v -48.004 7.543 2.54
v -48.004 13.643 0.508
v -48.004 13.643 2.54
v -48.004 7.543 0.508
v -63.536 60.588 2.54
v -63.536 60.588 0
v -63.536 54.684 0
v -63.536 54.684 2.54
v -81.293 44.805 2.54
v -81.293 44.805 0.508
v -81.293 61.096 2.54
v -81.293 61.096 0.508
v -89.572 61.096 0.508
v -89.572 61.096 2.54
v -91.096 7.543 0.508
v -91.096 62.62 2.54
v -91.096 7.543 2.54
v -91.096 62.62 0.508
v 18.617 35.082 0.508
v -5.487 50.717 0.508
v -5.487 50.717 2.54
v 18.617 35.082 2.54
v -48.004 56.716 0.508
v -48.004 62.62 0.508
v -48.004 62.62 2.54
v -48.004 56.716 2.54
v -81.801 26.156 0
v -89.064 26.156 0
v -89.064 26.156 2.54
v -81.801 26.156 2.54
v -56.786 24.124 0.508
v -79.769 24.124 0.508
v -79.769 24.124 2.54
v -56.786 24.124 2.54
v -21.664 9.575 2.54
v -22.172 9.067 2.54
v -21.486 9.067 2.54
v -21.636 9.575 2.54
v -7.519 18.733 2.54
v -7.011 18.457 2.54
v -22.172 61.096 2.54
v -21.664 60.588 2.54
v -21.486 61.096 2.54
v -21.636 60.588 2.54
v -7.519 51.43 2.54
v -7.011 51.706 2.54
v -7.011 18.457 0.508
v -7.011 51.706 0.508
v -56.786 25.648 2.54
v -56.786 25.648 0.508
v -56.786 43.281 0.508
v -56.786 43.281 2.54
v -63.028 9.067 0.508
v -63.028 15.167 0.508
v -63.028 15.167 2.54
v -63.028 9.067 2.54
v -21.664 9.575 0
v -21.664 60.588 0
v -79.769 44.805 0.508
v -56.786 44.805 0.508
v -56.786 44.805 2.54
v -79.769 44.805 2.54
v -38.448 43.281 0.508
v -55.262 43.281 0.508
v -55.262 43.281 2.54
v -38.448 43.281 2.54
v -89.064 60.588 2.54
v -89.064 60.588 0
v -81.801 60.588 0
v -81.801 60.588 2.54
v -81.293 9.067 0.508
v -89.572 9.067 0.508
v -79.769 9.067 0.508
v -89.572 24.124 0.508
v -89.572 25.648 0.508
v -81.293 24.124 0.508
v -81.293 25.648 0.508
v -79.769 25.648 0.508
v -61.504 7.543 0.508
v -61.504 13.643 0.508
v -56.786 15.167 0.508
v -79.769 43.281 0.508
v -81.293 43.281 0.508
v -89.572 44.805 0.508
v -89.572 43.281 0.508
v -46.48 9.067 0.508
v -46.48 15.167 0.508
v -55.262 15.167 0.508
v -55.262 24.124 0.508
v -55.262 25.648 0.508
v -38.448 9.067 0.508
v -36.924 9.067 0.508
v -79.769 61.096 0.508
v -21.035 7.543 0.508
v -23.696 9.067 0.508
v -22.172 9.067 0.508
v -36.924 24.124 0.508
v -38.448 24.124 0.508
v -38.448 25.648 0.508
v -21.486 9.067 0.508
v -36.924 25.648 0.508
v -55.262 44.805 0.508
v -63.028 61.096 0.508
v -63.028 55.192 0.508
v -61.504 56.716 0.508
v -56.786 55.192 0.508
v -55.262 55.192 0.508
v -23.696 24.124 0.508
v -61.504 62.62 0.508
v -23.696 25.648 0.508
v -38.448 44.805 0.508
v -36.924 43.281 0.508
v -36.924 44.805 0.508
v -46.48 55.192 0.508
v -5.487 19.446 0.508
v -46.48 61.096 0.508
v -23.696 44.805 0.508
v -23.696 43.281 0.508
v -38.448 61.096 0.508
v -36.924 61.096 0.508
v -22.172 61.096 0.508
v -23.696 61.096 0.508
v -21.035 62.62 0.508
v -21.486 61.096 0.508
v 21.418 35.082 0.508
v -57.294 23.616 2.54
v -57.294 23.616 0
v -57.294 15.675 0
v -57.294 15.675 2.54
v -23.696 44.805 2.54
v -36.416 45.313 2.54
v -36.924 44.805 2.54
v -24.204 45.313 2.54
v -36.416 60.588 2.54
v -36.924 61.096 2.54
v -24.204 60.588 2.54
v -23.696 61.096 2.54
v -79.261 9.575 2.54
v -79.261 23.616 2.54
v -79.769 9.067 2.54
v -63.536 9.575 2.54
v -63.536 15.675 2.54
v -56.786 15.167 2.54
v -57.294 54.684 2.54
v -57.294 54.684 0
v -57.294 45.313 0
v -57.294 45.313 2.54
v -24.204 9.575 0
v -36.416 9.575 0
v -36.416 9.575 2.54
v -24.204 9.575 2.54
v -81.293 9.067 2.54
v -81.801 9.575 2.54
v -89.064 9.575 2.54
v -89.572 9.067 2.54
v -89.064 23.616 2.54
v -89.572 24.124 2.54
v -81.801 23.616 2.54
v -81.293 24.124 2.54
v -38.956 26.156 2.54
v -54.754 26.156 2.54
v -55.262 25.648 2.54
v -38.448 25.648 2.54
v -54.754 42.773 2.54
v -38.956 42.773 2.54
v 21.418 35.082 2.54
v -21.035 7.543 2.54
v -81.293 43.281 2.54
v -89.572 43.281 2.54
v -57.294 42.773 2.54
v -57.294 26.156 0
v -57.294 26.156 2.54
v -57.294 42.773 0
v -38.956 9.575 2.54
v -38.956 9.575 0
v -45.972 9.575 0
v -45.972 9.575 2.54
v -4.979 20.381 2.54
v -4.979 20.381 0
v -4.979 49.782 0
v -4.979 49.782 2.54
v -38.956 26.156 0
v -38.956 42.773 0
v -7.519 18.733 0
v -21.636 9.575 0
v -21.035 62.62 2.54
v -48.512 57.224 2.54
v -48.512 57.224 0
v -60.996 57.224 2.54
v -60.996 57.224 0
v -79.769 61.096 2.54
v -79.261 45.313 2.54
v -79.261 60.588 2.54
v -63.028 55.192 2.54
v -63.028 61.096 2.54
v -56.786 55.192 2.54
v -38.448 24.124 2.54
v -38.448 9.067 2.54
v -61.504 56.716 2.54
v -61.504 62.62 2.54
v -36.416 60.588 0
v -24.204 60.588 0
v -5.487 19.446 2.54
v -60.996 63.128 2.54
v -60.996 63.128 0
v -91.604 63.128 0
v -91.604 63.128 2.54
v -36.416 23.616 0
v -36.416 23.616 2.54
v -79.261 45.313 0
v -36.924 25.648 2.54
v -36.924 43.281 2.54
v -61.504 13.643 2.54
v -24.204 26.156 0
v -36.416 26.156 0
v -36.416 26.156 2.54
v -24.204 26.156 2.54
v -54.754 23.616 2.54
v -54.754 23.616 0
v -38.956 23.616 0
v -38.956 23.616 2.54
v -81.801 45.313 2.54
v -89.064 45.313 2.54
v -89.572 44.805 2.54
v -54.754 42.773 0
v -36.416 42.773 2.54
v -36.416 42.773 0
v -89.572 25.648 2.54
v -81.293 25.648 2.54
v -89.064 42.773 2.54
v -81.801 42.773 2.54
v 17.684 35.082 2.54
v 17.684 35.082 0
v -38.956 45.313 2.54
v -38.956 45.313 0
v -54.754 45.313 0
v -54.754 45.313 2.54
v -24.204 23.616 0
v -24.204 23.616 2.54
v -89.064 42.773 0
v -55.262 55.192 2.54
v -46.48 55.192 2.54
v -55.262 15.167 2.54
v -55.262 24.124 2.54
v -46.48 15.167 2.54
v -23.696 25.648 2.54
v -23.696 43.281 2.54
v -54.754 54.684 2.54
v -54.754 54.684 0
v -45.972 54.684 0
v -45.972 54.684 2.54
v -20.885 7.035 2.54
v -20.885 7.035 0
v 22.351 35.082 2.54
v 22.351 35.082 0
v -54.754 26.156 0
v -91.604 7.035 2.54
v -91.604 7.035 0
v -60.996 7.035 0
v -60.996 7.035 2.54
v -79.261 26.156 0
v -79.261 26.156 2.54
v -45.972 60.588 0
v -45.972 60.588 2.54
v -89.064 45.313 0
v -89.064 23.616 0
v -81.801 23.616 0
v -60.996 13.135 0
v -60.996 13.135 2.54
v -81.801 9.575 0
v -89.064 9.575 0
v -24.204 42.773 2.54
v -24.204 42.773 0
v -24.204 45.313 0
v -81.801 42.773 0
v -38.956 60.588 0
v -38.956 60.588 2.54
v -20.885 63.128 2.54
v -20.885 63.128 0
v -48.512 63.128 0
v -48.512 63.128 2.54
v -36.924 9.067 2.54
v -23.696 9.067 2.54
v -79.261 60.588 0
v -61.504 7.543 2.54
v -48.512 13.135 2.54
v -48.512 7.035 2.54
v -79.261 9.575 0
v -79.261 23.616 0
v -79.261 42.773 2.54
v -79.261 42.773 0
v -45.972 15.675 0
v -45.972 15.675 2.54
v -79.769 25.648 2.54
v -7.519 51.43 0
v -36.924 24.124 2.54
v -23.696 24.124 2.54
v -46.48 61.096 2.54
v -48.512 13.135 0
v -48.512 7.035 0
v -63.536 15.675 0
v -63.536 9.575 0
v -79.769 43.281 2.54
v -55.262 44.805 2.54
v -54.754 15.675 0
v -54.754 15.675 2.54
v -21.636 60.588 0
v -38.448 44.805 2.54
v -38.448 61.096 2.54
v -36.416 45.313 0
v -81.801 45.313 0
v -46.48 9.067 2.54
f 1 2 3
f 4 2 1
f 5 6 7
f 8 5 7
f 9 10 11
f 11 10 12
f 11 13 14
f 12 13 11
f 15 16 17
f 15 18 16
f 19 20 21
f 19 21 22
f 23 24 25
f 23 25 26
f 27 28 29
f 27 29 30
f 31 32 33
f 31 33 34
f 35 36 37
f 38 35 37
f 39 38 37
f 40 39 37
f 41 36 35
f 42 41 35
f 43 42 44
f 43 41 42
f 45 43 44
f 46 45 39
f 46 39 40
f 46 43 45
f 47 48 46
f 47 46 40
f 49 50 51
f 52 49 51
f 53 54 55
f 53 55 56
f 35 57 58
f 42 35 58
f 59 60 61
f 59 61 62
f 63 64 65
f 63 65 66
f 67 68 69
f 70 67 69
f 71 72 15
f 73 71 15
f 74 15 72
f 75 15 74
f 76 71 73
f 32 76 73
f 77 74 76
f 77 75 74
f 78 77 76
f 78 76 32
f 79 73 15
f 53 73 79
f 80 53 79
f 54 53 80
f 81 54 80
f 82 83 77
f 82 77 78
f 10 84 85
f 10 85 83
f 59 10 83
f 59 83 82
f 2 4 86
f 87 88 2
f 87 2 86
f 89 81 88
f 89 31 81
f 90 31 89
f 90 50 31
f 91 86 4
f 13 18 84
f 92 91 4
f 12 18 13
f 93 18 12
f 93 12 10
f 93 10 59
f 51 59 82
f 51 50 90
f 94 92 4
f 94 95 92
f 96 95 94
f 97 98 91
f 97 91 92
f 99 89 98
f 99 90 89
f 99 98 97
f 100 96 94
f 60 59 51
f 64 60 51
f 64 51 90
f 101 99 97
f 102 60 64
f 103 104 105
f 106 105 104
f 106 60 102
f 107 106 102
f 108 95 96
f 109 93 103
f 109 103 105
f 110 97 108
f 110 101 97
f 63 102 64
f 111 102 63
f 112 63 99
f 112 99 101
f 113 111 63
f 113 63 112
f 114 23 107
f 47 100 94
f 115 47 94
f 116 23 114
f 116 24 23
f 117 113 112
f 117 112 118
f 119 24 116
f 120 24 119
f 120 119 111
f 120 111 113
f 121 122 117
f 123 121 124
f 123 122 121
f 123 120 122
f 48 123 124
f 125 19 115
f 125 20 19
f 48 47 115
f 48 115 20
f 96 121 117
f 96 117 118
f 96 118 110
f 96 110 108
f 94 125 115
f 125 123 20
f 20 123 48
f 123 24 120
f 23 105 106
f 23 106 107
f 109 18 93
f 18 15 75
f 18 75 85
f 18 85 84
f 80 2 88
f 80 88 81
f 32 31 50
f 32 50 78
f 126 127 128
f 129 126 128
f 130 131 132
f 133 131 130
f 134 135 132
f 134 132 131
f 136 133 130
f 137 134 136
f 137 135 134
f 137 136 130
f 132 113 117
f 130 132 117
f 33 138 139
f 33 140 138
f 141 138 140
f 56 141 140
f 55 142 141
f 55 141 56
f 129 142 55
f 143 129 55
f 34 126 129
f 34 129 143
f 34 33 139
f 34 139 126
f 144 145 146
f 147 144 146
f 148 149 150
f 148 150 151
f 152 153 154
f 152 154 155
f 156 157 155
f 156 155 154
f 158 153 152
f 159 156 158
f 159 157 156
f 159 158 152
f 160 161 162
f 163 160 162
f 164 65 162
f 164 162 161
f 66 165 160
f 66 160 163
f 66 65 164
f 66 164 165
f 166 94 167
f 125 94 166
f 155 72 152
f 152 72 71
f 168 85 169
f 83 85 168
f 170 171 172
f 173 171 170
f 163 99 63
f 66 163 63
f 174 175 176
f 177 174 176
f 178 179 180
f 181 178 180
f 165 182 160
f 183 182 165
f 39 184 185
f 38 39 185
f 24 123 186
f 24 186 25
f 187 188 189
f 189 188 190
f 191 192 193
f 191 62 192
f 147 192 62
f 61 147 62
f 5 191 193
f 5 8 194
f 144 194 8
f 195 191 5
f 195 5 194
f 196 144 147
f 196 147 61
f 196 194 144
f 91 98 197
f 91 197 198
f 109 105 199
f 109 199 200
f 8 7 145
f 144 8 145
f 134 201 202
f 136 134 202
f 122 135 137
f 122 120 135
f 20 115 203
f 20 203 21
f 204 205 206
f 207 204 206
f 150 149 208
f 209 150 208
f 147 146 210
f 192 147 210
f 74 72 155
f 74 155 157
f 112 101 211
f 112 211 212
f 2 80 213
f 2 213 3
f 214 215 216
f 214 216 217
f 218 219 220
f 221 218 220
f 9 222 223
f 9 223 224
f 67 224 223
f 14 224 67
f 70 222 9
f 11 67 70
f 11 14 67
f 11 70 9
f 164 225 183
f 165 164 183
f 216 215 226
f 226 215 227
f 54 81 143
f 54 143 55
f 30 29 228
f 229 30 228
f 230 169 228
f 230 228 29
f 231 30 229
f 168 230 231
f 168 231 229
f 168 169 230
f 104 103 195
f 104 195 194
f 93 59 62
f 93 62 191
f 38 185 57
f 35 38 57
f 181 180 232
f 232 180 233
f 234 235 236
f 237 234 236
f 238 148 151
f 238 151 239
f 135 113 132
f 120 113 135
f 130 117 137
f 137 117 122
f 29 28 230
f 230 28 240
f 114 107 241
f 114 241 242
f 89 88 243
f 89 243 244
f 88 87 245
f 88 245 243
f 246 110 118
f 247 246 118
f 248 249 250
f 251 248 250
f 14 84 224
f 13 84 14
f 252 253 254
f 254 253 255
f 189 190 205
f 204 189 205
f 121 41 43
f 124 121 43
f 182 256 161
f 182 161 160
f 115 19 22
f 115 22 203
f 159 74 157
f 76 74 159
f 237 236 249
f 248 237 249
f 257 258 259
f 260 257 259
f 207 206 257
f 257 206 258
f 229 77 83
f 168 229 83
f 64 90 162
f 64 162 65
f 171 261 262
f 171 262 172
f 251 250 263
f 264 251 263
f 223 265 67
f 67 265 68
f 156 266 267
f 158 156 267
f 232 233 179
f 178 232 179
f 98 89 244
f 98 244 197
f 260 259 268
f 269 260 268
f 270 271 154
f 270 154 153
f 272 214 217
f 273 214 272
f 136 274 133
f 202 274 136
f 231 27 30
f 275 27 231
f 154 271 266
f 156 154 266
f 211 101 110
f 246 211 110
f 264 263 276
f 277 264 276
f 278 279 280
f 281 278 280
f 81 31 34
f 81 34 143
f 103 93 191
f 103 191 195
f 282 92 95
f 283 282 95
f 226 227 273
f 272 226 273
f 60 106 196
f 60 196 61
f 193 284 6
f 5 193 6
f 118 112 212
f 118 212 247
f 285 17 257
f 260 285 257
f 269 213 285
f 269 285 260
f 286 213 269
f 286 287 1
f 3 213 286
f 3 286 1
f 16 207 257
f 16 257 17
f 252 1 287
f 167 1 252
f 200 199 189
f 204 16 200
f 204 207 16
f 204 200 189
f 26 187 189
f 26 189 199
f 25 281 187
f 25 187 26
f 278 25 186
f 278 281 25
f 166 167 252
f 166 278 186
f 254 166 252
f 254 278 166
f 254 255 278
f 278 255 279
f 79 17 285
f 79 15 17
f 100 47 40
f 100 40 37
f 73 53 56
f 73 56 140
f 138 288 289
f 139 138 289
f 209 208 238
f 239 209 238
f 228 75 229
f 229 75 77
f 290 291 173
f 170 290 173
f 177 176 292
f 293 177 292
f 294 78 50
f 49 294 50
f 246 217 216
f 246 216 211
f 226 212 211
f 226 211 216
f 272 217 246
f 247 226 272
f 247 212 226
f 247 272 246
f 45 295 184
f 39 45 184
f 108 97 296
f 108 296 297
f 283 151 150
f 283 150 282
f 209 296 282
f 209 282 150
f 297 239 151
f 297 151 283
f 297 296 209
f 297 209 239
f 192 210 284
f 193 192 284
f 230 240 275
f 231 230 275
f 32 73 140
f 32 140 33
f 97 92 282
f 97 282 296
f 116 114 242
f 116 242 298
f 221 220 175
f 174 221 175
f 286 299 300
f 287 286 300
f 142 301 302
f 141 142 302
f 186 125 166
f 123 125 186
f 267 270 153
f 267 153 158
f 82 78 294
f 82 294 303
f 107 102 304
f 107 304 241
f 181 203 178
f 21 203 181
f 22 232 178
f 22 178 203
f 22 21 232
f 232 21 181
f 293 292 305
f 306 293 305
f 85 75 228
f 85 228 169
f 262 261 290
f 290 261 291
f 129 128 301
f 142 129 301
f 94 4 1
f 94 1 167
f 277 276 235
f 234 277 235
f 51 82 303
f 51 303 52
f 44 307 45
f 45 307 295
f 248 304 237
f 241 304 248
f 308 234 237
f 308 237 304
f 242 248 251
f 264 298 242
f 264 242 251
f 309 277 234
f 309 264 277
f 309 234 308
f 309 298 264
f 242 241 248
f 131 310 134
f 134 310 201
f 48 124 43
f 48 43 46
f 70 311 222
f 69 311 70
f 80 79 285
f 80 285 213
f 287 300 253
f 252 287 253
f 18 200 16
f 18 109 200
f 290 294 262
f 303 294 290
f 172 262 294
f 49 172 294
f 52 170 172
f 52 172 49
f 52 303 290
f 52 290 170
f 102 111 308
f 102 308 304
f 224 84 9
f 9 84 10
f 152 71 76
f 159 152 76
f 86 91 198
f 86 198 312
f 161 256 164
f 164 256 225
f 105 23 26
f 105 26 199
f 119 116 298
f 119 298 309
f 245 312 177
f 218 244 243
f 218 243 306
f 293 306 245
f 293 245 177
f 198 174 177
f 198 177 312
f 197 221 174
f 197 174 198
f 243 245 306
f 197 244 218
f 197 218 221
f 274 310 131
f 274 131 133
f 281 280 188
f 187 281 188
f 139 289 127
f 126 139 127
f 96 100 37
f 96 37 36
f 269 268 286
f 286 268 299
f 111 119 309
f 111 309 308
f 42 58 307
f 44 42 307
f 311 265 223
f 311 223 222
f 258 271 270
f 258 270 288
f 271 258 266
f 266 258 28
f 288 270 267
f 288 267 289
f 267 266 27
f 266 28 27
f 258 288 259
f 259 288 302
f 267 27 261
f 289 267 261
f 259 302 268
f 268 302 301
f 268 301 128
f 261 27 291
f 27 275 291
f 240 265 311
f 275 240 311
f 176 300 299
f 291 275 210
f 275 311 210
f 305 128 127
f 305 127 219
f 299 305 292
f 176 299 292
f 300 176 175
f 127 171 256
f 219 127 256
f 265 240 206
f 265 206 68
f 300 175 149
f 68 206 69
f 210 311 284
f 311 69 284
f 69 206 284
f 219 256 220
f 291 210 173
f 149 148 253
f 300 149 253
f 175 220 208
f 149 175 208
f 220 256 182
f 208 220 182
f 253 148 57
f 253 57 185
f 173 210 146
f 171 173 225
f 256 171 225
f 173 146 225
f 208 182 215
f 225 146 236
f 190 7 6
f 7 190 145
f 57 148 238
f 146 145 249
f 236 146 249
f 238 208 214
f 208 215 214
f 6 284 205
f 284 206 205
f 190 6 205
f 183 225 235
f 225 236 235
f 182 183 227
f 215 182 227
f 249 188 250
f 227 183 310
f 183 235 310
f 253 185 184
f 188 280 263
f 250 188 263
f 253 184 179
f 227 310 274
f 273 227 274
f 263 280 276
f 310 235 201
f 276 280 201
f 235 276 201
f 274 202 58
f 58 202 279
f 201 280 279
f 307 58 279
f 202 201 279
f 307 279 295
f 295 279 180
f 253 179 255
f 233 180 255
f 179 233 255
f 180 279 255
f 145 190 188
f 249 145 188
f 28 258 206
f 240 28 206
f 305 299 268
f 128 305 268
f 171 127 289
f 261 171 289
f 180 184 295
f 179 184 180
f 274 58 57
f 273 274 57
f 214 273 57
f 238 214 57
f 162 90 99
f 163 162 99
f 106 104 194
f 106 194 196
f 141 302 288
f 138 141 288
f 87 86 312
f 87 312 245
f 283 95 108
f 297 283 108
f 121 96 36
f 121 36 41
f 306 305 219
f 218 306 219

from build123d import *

# Parameters (mm, degrees)
F0_W     = 7.26223737
F0_H     = 14.0403658152
F0_H_2   = 16.6169349104
F0_W_2   = 21.9669826329
F0_W_3   = 15.7987792045
F0_W_4   = 12.2116522557
F0_H_3   = 15.2750127017
F1_DEPTH = 2.54
F2_T     = -0.508


with BuildPart() as f1:
    # F0 (on Top) → F1 (new body)
    with BuildSketch(Plane.XY):
        Polygon((-48.5124173612, 7.03542912), (-20.8847596319, 7.03542912), (22.3510192425, 35.0815849379), (-20.8847596319, 63.1277407557), (-48.5124173612, 63.1277407557), (-48.5124173612, 57.2236290348), (-60.9962199777, 57.2236290348), (-60.9962199777, 63.1277407557), (-91.6035394222, 63.1277407557), (-91.6035394222, 7.03542912), (-60.9962199777, 7.03542912), (-60.9962199777, 13.134556353), (-48.5124173612, 13.134556353), align=None)
        with Locations((-85.432421416, 16.5956113487)):
            Rectangle(F0_W, F0_H, mode=Mode.SUBTRACT)
        Polygon((-57.2943203151, 15.6745556742), (-63.5362192988, 15.6745556742), (-63.5362192988, 9.5754284412), (-79.261302948, 9.5754284412), (-79.261302948, 23.6157942563), (-57.2943203151, 23.6157942563), align=None, mode=Mode.SUBTRACT)
        Polygon((-38.955539465, 9.5754284412), (-45.97241804, 9.5754284412), (-45.97241804, 15.6745556742), (-54.7543186694, 15.6745556742), (-54.7543186694, 23.6157942563), (-38.955539465, 23.6157942563), align=None, mode=Mode.SUBTRACT)
        with Locations((-85.432421416, 34.4642614946)):
            Rectangle(F0_W, F0_H_2, mode=Mode.SUBTRACT)
        with Locations((-68.2778116316, 34.4642614946)):
            Rectangle(F0_W_2, F0_H_2, mode=Mode.SUBTRACT)
        with Locations((-46.8549290672, 34.4642614946)):
            Rectangle(F0_W_3, F0_H_2, mode=Mode.SUBTRACT)
        with Locations((-30.3097135541, 16.5956113487)):
            Rectangle(F0_W_4, F0_H, mode=Mode.SUBTRACT)
        with Locations((-30.3097135541, 34.4642614946)):
            Rectangle(F0_W_4, F0_H_2, mode=Mode.SUBTRACT)
        Polygon((-7.5185770554, 18.7333902767), (-21.6364338994, 9.5754284412), (-21.6638874263, 9.5754284412), (-21.6638874263, 23.6157942563), (-21.6638874263, 26.1557940394), (-21.6638874263, 42.7727289498), (-21.6638874263, 45.3127287328), (-21.6638874263, 60.5877414346), (-21.6364338994, 60.5877414346), (-7.5185770554, 51.429779599), align=None, mode=Mode.SUBTRACT)
        with Locations((-85.432421416, 52.9502350837)):
            Rectangle(F0_W, F0_H_3, mode=Mode.SUBTRACT)
        Polygon((-79.261302948, 60.5877414346), (-63.5362192988, 60.5877414346), (-63.5362192988, 54.6836297136), (-57.2943203151, 54.6836297136), (-57.2943203151, 45.3127287328), (-79.261302948, 45.3127287328), align=None, mode=Mode.SUBTRACT)
        Polygon((-54.7543186694, 54.6836297136), (-45.97241804, 54.6836297136), (-45.97241804, 60.5877414346), (-38.955539465, 60.5877414346), (-38.955539465, 45.3127287328), (-54.7543186694, 45.3127287328), align=None, mode=Mode.SUBTRACT)
        Polygon((-4.9785770554, 49.7821341158), (17.6836978644, 35.0815849379), (-4.9785770554, 20.38103576), align=None, mode=Mode.SUBTRACT)
        with Locations((-30.3097135541, 52.9502350837)):
            Rectangle(F0_W_4, F0_H_3, mode=Mode.SUBTRACT)
    extrude(amount=F1_DEPTH)

    # F2
    f2_openings = [f1.faces().sort_by_distance(p)[0] for p in [
        (-90.333422, 35.081585, 2.54),
    ]]
    offset(amount=F2_T, openings=f2_openings, kind=Kind.INTERSECTION)


solid = f1.part
